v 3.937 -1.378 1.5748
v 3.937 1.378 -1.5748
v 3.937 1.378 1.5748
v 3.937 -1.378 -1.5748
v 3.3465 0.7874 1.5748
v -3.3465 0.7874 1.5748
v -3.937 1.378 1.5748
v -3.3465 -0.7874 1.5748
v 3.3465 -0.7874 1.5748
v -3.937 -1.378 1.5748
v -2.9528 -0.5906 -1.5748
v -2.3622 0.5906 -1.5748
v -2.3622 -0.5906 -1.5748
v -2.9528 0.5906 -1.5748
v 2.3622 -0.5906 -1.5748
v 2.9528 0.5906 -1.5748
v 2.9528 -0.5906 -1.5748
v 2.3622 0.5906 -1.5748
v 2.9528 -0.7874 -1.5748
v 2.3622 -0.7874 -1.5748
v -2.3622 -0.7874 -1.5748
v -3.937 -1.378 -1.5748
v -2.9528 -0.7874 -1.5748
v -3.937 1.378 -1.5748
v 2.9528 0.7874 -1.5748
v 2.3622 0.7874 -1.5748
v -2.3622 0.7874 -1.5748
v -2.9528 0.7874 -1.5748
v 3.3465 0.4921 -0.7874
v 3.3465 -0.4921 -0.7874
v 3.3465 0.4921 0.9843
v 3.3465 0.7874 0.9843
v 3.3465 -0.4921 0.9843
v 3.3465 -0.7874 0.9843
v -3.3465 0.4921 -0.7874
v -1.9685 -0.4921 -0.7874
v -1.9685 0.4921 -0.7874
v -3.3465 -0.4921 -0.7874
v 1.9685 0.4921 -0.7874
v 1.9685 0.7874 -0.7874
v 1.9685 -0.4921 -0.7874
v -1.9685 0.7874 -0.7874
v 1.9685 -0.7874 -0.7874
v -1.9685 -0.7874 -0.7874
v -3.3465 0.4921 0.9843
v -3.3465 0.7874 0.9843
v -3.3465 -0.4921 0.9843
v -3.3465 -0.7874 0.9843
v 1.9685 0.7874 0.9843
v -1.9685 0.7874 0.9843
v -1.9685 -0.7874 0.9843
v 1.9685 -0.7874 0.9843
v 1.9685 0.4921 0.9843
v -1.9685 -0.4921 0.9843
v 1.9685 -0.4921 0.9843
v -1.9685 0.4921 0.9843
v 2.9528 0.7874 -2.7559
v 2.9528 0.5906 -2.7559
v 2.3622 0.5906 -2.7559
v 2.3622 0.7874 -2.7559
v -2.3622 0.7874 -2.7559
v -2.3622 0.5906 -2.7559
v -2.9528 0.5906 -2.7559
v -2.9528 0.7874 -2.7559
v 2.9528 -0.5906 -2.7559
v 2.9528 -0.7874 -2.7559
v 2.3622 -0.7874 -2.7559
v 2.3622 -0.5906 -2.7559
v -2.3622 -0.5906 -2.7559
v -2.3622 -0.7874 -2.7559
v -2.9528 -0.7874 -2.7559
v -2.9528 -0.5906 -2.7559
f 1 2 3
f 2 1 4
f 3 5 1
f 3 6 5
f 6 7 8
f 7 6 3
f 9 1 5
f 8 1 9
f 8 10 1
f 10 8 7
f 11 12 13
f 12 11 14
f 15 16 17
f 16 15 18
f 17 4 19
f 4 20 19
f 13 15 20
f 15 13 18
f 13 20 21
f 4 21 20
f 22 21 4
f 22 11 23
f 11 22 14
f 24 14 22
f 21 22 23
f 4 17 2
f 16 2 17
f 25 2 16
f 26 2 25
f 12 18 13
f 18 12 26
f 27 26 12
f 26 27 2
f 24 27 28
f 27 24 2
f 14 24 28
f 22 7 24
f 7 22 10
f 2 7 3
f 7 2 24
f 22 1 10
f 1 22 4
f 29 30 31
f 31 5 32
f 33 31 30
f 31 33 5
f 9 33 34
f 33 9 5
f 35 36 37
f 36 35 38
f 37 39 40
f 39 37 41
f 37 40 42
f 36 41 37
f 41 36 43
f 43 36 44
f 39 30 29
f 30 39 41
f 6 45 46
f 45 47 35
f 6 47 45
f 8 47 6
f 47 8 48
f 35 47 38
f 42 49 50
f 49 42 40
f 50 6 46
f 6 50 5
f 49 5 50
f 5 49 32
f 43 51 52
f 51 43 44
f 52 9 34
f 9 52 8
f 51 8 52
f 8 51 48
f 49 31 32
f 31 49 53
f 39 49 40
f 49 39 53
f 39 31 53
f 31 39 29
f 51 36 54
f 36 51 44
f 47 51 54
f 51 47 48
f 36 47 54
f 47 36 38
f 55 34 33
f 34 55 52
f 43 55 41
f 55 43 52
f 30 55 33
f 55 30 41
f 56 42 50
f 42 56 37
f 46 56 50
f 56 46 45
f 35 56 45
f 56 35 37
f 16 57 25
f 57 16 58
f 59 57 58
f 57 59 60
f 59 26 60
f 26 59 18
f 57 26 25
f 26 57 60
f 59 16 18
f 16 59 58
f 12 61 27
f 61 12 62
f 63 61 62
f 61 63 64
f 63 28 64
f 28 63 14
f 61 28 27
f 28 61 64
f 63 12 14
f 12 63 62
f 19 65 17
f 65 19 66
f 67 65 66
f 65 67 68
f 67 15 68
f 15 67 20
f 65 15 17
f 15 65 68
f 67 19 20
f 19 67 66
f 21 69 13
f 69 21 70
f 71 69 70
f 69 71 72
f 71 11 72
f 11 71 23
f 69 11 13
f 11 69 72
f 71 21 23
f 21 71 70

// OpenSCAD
function mil(mm) = mm*1000/25.4;

difference() {
	cube(size = [mil(20)/100,mil(7)/100,mil(8)/100], center = true);
	translate([0,0,mil(2)/100]) {
		cube(size = [mil(17)/100,mil(4)/100,mil(8)/100], center = true);
	}
}

translate([mil(15/2-1.5/2)/100, mil(4/2-.5/2)/100, mil(0)/100]) {
	cube(size = [mil(3.5)/100,mil(1)/100,mil(5)/100], center = true);
}

translate([-mil(15/2-1.5/2)/100, -mil(4/2-.5/2)/100, mil(0)/100]) {
	cube(size = [mil(3.5)/100,mil(1)/100,mil(5)/100], center = true);
}

translate([mil(15/2-1.5/2)/100, -mil(4/2-.5/2)/100, mil(0)/100]) {
	cube(size = [mil(3.5)/100,mil(1)/100,mil(5)/100], center = true);
}

translate([-mil(15/2-1.5/2)/100, mil(4/2-.5/2)/100, mil(0)/100]) {
	cube(size = [mil(3.5)/100,mil(1)/100,mil(5)/100], center = true);
}


translate([mil(15/2-1.5/2)/100, mil(4/2-.5/2)/100, mil(-5)/100]) {
	cube(size = [mil(1.5)/100,mil(.5)/100,mil(4)/100], center = true);
}
translate([mil(-15/2+1.5/2)/100, mil(4/2-.5/2)/100, mil(-5)/100]) {
	cube(size = [mil(1.5)/100,mil(.5)/100,mil(4)/100], center = true);
}
translate([mil(15/2-1.5/2)/100, -mil(4/2-.5/2)/100, mil(-5)/100]) {
	cube(size = [mil(1.5)/100,mil(.5)/100,mil(4)/100], center = true);
}
translate([mil(-15/2+1.5/2)/100, -mil(4/2-.5/2)/100, mil(-5)/100]) {
	cube(size = [mil(1.5)/100,mil(.5)/100,mil(4)/100], center = true);
}
